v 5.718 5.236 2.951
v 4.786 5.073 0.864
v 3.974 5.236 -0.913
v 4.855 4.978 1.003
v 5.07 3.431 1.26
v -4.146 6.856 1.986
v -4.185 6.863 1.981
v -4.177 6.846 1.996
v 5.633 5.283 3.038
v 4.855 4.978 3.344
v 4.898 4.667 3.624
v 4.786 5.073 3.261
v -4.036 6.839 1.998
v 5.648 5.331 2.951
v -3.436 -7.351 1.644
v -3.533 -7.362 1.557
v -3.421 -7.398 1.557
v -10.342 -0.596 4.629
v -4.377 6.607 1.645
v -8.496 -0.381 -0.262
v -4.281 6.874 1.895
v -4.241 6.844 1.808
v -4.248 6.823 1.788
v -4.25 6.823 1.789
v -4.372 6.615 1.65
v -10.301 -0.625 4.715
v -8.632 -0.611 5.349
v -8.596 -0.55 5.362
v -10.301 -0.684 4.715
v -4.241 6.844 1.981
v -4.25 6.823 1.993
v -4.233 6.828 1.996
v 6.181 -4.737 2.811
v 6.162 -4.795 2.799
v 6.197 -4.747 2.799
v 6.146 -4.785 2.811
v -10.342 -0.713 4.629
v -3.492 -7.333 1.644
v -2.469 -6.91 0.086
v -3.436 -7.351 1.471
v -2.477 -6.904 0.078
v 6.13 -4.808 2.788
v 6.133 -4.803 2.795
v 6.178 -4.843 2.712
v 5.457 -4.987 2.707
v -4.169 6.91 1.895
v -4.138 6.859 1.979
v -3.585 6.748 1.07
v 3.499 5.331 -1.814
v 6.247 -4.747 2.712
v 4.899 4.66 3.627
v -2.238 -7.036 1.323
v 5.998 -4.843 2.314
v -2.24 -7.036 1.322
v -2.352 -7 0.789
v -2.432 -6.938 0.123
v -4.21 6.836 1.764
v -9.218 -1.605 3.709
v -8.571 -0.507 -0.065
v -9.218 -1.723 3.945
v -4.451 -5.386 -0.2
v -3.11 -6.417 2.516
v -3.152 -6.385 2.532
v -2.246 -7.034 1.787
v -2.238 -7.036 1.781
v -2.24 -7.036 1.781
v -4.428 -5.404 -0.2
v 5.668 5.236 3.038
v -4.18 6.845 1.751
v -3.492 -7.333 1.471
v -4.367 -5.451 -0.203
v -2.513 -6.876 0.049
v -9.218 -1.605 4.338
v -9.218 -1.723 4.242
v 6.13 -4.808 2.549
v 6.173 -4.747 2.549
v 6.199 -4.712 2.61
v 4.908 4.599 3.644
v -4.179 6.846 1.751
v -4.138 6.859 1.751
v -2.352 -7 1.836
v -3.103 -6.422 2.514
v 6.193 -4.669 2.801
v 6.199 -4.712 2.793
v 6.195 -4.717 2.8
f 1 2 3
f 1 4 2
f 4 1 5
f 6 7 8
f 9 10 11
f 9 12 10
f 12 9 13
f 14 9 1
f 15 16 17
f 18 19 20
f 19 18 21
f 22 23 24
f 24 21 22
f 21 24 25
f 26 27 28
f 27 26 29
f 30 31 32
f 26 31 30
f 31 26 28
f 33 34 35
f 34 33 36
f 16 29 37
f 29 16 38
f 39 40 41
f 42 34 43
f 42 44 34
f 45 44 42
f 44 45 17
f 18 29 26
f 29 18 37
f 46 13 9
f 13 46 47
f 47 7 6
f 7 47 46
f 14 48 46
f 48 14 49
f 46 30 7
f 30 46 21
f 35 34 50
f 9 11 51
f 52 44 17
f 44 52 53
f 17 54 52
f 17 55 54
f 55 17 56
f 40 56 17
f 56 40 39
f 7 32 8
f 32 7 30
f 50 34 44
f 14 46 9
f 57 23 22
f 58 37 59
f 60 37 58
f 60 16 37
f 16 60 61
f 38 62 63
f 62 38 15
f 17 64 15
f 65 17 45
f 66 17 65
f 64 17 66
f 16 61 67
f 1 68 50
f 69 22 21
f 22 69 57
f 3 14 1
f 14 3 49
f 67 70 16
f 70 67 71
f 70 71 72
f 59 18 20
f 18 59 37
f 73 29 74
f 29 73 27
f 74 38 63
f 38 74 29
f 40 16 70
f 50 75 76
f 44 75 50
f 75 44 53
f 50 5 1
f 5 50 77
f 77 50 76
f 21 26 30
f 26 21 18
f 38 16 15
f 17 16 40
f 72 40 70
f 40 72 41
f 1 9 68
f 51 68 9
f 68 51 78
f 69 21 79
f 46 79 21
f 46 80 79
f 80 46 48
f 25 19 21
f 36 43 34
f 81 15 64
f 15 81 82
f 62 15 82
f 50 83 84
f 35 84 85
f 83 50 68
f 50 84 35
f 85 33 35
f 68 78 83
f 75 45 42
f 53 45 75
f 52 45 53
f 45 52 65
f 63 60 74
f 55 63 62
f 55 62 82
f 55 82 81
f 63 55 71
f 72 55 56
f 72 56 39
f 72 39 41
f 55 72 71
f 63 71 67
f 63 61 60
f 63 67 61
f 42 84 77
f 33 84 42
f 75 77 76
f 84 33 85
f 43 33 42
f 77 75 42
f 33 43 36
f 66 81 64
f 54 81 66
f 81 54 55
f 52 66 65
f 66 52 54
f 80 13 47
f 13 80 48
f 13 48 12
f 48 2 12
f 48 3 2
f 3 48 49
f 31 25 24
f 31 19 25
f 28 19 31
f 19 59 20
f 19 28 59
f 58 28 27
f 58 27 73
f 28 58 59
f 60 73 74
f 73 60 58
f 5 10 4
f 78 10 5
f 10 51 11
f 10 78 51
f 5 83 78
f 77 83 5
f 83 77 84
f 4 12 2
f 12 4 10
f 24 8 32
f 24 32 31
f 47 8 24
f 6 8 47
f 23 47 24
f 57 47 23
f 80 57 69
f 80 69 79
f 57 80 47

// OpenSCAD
// Auto-generated OpenSCAD file

    inner_points = 10*[[0.47553456087715823, 0.4978078842969692, -0.2072352496078125], [-0.22709237834801976, -0.6940962000115061, -0.4999467766849563], [-0.36142103174737733, 0.2749515102768153, -0.7070755966518479], [0.6098632142765158, -0.47123982599135217, -0.00010642964092089091], [-0.41688364699083813, 0.6763916464639828, 0.20712881996862775], [-0.9137159203613099, -0.16641181407448244, 0.00015051424090967158], [0.2699180298323196, 0.14875469252611018, 0.7070315120518591], [-0.22691424353815204, -0.694048768012355, 0.500053206324141], [0.4993618307547157, -0.17324932327067738, -0.948257843987832]];

    outer_points = 10*[[-0.42003278146638656, 0.681501101519495, 0.18948721966919727], [-0.3451825718394467, -0.7303265261001592, 0.15572043112390738], [-0.09183323192223902, -0.024412712290332116, 0.8171581072778895], [-0.6733821213835942, -0.024412712290332116, -0.4719504564847848], [0.5617527129175098, 0.5235691569685188, 0.2951032407441999], [0.6146798037179536, -0.47474373238785456, 0.2712265155849332], [0.15053554958787962, 0.5235691569685188, -0.6164341663780378], [0.2034626403883234, -0.47474373238785456, -0.6403108915373046], [-1.0260745241448967, -0.06546983679345328, 0.4628877014666302]];

    // Convex hull for inner set (I)
    module inner_hull() {
        hull() {
            for (p = inner_points) {
                translate(p) sphere(r=0.1);
            }
        }
    }

    // Convex hull for outer set (O) minus inner hull (O \ I)
    module outer_minus_inner() {
        difference() {
            hull() {
                for (p = outer_points) {
                    translate(p) sphere(r=0.1);
                }
            }
            inner_hull(); // Subtract inner hull
        }
    }

    // Convex hull for outer set (O) minus all translated inner hulls
    module outer_minus_AllTranslationInner() {
        difference() {
            hull() {
                for (p = outer_points) {
                    translate(p) sphere(r=0.1);
                }
            }
            hull() {
                translate([0,0,50]) inner_hull();
                translate([0,0,-50]) inner_hull();
            }; // Subtract translated inner hulls
        }
    }

    // Difference between outer_minus_inner and outer_minus_AllTranslationInner
    module outer_minus_inner_diff() {
        difference() {
            // Outer minus inner
            difference() {
                hull() {
                    for (p = outer_points) {
                        translate(p) sphere(r=0.1);
                    }
                }
                inner_hull();
            }

            // Subtract Outer minus AllTranslationInner
            difference() {
                hull() {
                    for (p = outer_points) {
                        translate(p) sphere(r=0.1);
                    }
                }
                hull() {
                    translate([0,0,50]) inner_hull();
                    translate([0,0,-50]) inner_hull();
                };
            }
        }
    }

    // Rendering all with colors applied
    color([0, 1, 0, 1]) outer_minus_AllTranslationInner(); // Opaque green
    
